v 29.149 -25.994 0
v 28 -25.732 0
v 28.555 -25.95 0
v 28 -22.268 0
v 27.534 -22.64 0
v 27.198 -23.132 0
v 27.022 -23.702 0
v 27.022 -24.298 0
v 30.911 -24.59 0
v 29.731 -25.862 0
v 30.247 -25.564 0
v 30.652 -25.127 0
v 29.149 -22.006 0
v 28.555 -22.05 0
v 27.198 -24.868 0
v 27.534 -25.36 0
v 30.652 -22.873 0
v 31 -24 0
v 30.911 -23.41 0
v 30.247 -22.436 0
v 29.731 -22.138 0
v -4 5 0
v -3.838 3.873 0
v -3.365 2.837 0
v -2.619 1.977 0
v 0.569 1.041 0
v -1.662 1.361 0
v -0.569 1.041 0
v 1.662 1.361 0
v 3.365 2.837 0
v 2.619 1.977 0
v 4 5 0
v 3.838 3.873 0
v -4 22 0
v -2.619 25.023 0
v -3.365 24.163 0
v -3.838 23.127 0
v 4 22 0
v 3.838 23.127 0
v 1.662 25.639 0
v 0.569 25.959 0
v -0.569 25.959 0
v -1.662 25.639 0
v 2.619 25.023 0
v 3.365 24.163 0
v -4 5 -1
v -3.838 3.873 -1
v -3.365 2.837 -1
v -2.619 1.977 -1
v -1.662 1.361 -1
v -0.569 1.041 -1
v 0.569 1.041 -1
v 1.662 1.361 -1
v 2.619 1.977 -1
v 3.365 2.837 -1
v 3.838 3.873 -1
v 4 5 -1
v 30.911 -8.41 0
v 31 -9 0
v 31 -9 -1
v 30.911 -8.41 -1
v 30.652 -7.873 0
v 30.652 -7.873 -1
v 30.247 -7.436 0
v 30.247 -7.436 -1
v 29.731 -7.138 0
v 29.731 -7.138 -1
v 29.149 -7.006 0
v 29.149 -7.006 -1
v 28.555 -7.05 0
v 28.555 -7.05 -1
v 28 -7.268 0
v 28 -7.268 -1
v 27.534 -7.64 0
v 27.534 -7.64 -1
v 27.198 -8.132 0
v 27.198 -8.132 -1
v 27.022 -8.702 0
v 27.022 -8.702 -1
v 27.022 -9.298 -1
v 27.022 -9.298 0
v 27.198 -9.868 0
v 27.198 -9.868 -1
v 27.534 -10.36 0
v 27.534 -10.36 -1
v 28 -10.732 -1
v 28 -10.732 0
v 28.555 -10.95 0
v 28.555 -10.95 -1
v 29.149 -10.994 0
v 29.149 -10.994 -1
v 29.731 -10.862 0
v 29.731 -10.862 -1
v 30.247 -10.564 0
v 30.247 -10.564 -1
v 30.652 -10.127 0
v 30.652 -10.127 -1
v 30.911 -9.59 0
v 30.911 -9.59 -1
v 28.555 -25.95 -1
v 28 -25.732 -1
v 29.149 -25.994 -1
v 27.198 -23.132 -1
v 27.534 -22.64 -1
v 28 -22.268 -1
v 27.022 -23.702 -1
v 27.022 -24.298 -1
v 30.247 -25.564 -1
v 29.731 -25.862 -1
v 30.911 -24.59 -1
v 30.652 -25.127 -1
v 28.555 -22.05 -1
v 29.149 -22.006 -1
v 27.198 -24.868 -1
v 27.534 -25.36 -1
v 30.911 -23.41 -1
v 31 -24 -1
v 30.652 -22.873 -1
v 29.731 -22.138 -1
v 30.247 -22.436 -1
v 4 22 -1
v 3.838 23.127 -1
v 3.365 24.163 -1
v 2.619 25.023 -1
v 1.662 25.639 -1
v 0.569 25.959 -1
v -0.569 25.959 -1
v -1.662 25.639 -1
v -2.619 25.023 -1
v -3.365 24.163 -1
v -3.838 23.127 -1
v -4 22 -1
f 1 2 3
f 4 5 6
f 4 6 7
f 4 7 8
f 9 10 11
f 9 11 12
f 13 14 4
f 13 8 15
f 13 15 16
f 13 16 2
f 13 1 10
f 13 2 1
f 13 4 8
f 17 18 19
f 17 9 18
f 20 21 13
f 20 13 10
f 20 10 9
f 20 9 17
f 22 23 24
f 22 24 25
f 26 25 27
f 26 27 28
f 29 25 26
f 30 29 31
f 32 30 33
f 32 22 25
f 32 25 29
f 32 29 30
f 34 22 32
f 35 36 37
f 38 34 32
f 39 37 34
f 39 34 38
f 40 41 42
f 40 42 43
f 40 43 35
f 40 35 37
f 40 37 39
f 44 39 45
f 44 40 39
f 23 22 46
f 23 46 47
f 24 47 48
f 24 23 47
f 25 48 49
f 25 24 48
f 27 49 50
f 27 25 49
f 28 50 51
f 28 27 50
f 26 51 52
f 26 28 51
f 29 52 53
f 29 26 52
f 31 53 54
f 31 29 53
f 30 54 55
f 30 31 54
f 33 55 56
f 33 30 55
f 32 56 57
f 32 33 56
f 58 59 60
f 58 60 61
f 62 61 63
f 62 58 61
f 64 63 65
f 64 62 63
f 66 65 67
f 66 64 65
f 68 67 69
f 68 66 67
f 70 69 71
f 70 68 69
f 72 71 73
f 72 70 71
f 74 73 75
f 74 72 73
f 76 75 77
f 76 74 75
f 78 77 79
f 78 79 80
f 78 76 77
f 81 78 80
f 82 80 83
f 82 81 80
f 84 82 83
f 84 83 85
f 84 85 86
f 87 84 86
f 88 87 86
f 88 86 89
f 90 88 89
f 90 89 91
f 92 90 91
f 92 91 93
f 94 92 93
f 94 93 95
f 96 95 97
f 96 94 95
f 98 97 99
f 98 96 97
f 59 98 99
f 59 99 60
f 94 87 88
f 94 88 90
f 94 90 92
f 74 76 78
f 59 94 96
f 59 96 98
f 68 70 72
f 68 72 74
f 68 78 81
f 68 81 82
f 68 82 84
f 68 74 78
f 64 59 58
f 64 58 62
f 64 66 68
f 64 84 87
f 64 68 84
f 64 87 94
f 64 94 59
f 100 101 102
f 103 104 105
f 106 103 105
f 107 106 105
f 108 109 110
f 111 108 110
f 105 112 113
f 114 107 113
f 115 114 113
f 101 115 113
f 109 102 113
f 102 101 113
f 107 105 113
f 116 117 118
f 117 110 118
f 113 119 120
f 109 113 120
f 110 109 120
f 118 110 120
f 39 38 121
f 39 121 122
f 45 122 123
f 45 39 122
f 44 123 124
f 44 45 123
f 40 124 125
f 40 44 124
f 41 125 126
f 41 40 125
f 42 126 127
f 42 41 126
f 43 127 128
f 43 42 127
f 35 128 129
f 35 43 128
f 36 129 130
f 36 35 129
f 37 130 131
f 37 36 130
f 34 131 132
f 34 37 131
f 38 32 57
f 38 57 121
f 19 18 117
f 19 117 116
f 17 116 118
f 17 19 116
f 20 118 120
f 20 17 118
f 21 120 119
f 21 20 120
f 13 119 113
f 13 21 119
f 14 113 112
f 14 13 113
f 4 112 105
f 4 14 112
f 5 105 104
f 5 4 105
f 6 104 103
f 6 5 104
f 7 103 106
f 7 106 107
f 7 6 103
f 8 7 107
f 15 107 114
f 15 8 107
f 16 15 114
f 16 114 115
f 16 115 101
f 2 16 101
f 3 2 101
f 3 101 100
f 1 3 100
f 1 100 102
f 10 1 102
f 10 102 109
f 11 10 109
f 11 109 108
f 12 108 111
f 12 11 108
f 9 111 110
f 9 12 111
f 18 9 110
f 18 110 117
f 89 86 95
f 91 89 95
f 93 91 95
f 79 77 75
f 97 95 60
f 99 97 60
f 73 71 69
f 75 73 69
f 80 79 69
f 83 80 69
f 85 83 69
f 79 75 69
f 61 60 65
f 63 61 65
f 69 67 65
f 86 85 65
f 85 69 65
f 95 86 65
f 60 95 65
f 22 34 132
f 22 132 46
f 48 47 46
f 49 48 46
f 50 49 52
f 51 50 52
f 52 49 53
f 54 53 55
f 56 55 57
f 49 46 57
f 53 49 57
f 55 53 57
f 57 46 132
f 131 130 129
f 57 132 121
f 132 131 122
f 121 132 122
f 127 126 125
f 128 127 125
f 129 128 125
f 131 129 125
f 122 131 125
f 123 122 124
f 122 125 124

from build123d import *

# Parameters (mm, degrees)
SKETCH1_R             = 2
BOSS_EXTRUDE1_DEPTH   = 1
BOSS_EXTRUDE1_2_DEPTH = 1
BOSS_EXTRUDE1_3_DEPTH = 1


with BuildPart() as part:
    # Sketch1 → Boss-Extrude1 (new body)
    with BuildSketch(Plane.XY):
        with Locations((29, -24)):
            Circle(SKETCH1_R)
    extrude(amount=-BOSS_EXTRUDE1_DEPTH)


with BuildPart() as body_2:
    # Sketch1 → Boss-Extrude1 2 (new body)
    with BuildSketch(Plane.XY):
        with Locations((29, -9)):
            Circle(SKETCH1_R)
    extrude(amount=-BOSS_EXTRUDE1_2_DEPTH)


with BuildPart() as body_3:
    # Sketch1 → Boss-Extrude1 3 (new body)
    with BuildSketch(Plane.XY):
        with BuildLine():
            Line((4, 5), (4, 22))
            ThreePointArc((4, 22), (0, 26), (-4, 22))
            Line((-4, 22), (-4, 5))
            ThreePointArc((-4, 5), (0, 1), (4, 5))
        make_face()
    extrude(amount=-BOSS_EXTRUDE1_3_DEPTH)


solid = Compound([part.part, body_2.part, body_3.part])
